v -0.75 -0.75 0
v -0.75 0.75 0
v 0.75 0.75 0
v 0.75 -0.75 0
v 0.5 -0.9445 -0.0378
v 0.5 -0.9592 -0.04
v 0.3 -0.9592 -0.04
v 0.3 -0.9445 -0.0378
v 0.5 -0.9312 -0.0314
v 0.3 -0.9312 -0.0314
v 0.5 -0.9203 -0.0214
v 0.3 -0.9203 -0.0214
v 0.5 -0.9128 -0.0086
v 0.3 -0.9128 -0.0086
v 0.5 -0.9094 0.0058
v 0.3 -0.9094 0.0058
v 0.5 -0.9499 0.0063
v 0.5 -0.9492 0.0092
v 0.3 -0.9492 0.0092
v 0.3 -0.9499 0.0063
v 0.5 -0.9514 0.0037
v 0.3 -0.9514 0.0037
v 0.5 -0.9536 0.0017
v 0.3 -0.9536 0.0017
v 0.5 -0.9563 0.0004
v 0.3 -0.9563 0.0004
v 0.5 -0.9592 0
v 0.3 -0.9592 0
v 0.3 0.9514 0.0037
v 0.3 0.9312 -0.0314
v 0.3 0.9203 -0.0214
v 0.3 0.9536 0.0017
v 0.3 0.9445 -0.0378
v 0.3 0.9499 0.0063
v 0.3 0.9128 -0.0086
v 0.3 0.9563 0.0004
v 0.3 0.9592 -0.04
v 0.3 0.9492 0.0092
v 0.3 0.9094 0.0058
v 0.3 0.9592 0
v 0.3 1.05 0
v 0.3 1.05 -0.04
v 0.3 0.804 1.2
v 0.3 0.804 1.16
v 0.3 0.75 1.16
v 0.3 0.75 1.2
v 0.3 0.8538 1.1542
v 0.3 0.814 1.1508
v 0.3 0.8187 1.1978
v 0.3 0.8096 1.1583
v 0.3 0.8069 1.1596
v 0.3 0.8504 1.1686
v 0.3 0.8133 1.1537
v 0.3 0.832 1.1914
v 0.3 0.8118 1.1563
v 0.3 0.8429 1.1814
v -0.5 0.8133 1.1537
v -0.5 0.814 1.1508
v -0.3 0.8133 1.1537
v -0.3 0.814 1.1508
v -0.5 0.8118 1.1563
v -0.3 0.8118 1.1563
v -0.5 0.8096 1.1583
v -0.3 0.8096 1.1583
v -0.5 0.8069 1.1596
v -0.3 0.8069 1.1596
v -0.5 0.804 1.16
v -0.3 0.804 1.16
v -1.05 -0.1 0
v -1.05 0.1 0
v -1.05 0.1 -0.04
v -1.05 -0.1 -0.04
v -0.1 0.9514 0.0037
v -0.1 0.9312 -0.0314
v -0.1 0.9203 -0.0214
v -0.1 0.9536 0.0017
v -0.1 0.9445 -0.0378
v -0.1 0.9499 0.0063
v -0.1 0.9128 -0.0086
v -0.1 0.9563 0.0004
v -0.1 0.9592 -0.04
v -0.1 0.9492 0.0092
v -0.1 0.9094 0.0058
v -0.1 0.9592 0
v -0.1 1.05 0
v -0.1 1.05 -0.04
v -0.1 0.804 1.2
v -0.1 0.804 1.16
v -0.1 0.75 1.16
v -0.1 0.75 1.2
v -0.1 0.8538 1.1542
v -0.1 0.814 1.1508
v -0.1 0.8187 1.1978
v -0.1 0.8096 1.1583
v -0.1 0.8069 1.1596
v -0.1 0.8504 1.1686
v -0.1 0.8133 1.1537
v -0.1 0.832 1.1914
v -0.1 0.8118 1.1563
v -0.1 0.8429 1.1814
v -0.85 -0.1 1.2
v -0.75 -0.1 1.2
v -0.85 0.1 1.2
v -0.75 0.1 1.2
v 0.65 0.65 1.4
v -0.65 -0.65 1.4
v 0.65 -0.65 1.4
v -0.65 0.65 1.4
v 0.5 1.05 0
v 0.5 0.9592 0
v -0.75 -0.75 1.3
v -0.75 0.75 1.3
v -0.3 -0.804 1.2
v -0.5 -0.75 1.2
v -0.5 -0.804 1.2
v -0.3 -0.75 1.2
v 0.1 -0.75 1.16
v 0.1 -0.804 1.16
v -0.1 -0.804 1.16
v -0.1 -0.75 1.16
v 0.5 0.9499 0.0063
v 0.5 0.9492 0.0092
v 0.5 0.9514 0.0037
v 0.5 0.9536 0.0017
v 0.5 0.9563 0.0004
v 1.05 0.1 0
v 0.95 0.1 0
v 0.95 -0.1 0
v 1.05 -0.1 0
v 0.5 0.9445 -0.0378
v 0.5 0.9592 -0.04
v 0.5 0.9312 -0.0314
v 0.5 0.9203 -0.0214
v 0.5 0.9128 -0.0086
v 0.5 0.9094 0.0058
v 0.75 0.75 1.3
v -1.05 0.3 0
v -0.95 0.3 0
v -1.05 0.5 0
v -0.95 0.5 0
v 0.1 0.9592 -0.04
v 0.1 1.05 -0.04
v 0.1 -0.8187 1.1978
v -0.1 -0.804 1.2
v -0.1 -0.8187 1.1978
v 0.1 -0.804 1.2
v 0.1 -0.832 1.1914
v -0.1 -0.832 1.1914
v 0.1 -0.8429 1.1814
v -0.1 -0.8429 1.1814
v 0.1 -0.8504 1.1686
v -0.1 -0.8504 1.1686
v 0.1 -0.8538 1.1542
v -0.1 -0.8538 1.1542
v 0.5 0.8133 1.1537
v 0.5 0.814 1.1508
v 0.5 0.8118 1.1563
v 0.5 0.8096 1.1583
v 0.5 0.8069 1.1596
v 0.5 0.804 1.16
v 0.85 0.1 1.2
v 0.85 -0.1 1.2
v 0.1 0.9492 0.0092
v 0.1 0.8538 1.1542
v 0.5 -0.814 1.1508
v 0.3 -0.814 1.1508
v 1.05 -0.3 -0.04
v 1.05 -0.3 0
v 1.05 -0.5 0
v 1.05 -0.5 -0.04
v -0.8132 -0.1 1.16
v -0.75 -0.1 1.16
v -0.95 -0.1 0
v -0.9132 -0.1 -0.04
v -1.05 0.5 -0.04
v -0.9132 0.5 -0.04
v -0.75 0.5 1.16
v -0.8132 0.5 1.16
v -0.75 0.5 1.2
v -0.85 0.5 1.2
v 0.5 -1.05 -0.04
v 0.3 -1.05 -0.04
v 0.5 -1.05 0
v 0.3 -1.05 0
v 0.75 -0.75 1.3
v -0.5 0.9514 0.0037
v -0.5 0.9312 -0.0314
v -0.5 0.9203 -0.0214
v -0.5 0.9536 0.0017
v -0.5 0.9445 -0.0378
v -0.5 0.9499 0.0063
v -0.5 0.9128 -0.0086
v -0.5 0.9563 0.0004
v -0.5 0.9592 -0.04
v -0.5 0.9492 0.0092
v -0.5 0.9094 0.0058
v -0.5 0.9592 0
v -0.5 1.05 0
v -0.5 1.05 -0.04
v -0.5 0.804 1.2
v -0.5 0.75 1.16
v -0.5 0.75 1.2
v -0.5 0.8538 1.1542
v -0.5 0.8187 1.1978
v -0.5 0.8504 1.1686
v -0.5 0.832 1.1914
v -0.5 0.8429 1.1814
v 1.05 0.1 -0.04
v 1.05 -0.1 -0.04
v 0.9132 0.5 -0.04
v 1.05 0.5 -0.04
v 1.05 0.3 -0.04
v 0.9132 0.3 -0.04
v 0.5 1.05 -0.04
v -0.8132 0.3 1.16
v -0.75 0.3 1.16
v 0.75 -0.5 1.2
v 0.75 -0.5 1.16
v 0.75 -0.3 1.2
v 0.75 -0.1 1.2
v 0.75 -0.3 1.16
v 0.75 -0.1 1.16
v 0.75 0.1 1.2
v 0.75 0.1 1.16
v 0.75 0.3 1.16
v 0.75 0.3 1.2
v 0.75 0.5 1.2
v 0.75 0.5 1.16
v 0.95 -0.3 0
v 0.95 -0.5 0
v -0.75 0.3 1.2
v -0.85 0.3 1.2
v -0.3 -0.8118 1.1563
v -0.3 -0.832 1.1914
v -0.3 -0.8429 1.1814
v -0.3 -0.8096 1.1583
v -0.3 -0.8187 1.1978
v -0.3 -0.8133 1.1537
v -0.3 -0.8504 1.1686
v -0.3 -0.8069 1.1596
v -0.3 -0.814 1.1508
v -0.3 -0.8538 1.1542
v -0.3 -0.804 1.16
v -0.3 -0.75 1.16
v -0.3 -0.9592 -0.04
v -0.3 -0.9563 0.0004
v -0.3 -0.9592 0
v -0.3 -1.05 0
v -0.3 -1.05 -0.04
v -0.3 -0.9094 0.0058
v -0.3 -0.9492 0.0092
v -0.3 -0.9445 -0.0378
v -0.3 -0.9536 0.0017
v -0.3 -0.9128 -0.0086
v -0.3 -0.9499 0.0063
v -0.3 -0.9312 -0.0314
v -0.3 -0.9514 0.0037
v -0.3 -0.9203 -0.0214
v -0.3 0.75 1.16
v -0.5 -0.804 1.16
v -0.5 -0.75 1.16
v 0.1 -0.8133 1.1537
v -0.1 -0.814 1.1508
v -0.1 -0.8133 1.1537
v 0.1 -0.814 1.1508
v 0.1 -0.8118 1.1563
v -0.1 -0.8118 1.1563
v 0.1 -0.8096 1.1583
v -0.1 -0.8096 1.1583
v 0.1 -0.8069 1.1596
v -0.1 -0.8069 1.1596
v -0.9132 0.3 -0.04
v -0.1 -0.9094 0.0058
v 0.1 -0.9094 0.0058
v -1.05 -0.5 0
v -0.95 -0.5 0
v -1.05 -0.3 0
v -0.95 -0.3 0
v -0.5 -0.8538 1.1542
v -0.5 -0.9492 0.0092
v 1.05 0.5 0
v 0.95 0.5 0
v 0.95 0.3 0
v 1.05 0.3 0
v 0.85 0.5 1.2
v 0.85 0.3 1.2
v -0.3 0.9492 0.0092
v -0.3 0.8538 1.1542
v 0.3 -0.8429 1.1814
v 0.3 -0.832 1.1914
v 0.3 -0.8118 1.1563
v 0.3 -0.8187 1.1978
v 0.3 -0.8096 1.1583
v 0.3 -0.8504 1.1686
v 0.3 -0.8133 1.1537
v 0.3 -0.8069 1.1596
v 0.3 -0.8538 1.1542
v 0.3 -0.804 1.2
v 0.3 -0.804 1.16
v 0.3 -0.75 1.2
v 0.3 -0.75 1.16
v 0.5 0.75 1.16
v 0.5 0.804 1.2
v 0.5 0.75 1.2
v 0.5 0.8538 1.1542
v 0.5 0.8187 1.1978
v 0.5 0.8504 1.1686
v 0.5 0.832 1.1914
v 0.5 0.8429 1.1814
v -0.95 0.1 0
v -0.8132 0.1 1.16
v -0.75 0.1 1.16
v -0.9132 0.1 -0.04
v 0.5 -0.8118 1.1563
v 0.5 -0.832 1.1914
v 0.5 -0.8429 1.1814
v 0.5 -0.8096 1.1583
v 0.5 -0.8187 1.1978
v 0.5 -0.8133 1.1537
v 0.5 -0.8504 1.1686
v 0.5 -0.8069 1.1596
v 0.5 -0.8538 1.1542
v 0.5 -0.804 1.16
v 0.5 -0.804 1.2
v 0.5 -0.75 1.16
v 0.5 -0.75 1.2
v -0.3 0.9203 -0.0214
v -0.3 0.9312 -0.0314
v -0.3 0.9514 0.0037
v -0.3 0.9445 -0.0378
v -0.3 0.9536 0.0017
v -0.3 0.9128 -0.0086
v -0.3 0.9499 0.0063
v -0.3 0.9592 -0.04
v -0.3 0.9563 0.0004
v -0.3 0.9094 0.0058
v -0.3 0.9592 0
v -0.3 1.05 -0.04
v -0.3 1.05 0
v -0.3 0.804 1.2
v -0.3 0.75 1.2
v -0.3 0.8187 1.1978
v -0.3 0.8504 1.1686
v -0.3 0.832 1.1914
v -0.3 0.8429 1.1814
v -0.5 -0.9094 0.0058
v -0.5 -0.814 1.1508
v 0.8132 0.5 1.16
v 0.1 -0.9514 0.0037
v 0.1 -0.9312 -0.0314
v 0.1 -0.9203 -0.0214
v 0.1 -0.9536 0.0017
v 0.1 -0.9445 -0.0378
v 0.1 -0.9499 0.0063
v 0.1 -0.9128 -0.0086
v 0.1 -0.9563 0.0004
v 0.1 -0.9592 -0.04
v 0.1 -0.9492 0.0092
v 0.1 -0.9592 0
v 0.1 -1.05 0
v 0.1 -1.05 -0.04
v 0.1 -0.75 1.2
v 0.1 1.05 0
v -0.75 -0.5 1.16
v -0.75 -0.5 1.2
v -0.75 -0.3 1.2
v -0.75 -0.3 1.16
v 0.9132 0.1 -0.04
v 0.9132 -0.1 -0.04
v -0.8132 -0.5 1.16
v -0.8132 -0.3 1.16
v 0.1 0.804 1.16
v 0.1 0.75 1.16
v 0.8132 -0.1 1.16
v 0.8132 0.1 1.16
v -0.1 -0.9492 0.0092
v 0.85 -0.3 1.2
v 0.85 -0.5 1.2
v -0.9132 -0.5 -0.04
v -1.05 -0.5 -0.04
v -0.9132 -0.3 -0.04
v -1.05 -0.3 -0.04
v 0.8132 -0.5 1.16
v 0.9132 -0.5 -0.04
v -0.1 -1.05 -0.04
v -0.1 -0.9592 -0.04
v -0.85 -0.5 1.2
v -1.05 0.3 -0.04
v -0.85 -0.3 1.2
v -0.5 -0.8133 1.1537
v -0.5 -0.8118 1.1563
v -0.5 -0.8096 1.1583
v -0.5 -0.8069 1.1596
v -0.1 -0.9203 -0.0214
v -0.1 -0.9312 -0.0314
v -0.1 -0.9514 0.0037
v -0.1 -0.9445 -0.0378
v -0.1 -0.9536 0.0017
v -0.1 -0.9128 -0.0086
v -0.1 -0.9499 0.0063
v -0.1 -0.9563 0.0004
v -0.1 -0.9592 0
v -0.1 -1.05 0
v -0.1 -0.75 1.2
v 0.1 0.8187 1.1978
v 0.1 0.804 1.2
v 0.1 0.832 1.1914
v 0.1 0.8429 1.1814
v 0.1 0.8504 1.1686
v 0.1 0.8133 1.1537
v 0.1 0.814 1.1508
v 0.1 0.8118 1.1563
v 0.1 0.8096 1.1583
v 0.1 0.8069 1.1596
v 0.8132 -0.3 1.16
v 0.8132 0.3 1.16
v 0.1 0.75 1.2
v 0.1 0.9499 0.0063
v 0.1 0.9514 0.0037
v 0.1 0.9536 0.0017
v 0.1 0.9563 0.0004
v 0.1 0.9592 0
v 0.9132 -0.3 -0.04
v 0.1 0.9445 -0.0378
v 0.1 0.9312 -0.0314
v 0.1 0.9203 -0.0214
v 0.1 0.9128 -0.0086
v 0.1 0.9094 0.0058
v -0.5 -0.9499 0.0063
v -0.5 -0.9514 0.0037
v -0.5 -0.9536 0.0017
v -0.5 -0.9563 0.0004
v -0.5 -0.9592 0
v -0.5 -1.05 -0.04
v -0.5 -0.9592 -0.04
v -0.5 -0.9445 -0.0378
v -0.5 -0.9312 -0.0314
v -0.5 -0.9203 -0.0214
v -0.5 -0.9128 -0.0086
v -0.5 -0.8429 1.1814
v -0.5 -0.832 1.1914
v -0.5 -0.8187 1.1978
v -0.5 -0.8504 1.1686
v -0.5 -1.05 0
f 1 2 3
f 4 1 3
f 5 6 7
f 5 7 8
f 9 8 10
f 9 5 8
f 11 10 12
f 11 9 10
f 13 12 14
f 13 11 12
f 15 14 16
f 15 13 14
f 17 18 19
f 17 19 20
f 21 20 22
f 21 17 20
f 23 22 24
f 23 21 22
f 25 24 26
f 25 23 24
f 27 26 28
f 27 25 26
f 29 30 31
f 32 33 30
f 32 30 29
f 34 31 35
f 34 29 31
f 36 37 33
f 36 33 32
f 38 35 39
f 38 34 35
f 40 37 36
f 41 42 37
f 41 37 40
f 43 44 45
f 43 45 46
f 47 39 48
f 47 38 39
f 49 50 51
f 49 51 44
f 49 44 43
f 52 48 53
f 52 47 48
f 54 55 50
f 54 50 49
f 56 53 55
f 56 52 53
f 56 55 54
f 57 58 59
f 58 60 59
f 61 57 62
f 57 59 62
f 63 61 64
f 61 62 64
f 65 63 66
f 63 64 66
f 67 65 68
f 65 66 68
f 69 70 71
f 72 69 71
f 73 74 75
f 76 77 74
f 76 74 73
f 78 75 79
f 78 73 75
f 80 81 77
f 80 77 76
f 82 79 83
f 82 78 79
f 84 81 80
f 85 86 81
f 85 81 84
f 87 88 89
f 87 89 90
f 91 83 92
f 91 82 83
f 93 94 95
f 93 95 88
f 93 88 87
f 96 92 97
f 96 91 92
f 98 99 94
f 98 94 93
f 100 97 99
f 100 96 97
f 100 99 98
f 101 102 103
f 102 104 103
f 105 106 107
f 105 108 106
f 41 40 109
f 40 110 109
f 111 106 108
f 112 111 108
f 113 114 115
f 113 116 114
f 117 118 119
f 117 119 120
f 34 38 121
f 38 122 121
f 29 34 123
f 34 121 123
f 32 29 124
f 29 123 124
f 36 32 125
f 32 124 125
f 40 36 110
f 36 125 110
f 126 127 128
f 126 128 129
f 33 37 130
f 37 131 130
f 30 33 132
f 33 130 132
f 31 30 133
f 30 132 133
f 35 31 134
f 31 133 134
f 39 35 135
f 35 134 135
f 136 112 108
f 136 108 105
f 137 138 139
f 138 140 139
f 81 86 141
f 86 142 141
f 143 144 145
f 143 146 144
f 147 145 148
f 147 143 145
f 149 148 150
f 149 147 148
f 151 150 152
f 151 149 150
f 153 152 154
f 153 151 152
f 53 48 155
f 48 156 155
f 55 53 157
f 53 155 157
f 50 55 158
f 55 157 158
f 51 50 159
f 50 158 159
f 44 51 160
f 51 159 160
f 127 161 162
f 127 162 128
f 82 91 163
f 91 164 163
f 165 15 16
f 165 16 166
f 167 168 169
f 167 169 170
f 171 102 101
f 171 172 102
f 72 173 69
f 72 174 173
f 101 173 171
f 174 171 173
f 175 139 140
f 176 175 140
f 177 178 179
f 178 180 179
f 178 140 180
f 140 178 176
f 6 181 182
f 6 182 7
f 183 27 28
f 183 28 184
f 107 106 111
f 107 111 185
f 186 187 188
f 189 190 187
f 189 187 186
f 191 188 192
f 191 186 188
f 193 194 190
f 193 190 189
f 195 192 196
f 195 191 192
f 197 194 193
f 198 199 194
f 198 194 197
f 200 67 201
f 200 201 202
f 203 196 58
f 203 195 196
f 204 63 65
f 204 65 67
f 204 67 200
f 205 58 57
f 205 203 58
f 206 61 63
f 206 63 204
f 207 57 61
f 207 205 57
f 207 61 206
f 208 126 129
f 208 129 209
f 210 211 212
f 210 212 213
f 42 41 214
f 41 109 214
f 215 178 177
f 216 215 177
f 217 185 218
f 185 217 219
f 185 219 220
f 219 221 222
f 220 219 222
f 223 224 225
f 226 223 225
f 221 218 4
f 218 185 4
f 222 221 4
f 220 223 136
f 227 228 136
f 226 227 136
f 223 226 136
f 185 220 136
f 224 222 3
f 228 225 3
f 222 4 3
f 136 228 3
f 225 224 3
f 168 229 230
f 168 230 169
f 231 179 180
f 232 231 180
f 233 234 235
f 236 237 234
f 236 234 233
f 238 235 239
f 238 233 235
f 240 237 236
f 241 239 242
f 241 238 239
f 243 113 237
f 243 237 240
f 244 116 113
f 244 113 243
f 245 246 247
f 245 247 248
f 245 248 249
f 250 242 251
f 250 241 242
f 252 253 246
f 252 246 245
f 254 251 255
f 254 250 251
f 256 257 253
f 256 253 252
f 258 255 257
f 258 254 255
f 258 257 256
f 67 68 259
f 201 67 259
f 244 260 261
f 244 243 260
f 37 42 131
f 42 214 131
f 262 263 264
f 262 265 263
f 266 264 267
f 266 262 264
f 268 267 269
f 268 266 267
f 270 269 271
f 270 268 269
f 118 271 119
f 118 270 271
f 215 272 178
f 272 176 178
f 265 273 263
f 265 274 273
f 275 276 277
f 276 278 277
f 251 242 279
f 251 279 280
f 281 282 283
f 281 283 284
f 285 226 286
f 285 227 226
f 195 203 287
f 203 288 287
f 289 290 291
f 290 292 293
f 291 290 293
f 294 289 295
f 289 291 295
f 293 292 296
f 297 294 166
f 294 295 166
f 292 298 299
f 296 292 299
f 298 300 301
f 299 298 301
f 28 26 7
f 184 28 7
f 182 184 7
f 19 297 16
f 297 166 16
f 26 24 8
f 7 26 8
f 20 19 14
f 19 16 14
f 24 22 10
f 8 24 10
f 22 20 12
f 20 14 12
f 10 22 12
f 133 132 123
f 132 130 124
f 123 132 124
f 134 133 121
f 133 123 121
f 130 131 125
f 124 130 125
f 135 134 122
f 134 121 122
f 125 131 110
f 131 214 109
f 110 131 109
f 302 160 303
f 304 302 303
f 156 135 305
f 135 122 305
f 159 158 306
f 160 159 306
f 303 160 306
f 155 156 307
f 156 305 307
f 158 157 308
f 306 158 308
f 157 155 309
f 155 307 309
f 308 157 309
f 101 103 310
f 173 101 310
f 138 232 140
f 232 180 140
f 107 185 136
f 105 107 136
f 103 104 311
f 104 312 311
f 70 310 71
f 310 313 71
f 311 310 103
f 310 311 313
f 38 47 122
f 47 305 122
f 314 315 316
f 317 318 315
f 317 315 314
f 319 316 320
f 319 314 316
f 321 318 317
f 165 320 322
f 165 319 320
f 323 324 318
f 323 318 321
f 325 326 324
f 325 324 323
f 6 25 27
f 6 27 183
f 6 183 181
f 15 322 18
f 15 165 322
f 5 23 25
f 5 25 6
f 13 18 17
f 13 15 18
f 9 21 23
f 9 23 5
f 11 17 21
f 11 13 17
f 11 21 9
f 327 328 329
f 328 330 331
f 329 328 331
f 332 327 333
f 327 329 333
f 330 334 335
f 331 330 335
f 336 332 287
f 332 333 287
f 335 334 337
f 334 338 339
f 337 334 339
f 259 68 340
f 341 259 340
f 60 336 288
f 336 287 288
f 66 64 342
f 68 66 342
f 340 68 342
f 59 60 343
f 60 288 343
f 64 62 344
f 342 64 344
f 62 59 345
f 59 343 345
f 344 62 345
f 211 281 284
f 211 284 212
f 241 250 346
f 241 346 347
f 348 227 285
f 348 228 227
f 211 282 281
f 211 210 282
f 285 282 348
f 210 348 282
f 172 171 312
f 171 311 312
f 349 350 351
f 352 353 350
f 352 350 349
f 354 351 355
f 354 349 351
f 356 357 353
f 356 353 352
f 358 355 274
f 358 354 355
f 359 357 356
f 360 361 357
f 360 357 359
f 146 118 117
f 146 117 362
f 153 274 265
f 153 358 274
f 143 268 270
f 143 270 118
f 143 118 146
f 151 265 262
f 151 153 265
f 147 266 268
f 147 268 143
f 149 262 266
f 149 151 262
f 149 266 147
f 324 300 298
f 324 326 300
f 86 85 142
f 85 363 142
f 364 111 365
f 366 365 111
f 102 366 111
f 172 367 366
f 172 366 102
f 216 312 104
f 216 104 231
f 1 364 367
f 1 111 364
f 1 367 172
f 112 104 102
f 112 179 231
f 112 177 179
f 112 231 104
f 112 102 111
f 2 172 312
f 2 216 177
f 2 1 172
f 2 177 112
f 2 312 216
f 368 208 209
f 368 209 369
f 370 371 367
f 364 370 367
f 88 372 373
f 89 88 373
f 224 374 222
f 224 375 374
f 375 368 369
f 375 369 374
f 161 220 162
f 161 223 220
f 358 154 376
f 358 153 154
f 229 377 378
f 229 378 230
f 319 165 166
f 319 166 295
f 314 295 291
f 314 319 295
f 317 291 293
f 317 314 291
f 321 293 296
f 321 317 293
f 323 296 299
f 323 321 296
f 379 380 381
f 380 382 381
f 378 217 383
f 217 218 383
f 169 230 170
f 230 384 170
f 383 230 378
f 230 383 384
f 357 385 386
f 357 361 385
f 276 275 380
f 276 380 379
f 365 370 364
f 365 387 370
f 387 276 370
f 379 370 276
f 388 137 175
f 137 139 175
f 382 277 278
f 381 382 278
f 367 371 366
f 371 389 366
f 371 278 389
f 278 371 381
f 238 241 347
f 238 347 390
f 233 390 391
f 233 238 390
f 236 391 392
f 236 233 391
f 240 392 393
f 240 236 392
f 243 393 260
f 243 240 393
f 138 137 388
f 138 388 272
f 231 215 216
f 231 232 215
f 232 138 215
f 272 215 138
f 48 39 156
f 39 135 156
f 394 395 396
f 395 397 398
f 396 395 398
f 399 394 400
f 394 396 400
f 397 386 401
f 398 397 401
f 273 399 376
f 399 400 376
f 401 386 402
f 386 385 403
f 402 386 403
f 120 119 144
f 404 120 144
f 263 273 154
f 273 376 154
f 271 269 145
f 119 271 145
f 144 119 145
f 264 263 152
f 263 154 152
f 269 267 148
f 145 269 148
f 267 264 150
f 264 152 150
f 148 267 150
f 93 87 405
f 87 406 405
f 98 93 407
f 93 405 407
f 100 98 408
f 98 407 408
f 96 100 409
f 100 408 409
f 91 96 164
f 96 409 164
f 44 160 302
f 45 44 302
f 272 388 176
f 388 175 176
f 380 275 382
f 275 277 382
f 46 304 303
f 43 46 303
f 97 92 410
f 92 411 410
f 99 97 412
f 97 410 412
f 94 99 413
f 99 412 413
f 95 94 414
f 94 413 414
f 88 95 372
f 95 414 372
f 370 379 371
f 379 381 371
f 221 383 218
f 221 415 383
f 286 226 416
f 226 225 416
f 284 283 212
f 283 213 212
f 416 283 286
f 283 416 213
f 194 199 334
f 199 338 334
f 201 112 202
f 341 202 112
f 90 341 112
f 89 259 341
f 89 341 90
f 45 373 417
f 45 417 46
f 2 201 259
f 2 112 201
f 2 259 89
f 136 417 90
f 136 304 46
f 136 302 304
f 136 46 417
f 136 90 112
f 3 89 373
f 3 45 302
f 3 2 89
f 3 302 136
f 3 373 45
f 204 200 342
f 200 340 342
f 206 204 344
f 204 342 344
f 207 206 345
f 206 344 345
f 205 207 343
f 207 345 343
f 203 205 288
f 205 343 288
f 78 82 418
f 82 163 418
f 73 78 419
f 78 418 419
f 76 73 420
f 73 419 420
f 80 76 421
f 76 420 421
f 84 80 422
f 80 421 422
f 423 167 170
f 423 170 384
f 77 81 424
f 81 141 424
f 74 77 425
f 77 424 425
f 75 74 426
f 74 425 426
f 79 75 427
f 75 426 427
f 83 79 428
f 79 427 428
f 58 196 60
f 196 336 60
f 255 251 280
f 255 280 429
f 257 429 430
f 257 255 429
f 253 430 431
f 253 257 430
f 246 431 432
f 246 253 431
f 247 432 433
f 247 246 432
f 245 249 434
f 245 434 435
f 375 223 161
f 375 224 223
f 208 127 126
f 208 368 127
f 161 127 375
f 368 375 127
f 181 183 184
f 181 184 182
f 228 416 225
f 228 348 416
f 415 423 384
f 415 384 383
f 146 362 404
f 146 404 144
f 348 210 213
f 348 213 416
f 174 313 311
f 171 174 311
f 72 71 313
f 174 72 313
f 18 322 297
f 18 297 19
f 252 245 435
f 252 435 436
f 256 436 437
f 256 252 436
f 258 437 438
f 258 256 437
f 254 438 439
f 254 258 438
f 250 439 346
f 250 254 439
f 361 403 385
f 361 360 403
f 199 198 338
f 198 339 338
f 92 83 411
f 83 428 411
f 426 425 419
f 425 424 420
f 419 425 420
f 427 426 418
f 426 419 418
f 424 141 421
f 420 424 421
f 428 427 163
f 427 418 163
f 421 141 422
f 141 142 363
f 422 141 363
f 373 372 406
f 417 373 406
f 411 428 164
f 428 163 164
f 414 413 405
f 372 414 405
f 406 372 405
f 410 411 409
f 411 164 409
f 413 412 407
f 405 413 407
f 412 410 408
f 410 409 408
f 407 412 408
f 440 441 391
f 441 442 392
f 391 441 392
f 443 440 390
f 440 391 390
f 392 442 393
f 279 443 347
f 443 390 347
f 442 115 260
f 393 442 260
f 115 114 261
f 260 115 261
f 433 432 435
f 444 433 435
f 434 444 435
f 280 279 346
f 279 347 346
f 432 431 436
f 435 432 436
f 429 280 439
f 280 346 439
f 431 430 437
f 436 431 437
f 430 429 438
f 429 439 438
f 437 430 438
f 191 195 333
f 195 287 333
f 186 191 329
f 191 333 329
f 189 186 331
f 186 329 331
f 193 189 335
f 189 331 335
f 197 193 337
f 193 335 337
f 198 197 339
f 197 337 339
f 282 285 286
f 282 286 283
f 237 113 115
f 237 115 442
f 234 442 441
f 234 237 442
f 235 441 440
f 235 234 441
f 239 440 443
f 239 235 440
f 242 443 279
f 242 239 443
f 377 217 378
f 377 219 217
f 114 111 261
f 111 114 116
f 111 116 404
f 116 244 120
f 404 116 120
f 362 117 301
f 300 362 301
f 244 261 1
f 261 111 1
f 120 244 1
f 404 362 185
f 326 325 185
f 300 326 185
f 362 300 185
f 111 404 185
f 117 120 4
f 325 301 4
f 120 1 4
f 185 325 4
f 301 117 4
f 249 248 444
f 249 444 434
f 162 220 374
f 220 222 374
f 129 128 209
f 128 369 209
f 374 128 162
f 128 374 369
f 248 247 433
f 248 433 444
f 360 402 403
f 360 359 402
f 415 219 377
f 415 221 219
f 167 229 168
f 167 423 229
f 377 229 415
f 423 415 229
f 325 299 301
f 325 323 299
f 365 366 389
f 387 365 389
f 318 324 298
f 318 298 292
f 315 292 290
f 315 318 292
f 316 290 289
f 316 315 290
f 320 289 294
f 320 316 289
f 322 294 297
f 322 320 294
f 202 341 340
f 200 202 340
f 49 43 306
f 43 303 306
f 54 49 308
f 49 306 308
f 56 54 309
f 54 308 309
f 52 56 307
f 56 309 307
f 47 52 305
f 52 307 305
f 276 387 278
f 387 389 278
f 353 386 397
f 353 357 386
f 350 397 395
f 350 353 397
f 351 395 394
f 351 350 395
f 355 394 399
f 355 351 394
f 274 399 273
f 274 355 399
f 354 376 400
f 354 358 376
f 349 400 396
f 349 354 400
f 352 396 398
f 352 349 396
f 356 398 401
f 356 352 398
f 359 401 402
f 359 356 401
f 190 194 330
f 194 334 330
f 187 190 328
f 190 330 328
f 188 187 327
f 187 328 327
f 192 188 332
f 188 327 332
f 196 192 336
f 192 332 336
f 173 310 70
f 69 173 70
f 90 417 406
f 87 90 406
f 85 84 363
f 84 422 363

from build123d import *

# Parameters (mm, degrees)
COMPONENT_OUTLINE_W  = 1.5
COMPONENT_OUTLINE_H  = 1.5
EXTRUDE1_DEPTH       = 1.4
EXTRUDE_THIN1_DEPTH  = 0.1
LPATTERN1_COUNT      = 2
LPATTERN1_PITCH      = 0.4
LPATTERN1_COL_COUNT  = 2
LPATTERN1_COL_PITCH  = 0.4
MIRROR1_COPY_1_DEPTH = 0.1
MIRROR1_COPY_2_DEPTH = 0.1
EXTRUDE_THIN2_DEPTH  = 0.1
LPATTERN2_COUNT      = 2
LPATTERN2_PITCH      = 0.4
LPATTERN2_COL_COUNT  = 2
LPATTERN2_COL_PITCH  = 0.4
MIRROR2_COPY_1_DEPTH = 0.1
MIRROR2_COPY_2_DEPTH = 0.1
CHAMFER1_SIZE        = 0.1


with BuildPart() as part:
    # COMPONENT_OUTLINE → Extrude1 (new body)
    with BuildSketch(Plane.XY):
        Rectangle(COMPONENT_OUTLINE_W, COMPONENT_OUTLINE_H)
    extrude(amount=EXTRUDE1_DEPTH)

    # Sketch1 → Extrude-Thin1 (add, symmetric)
    with BuildSketch(Plane(origin=(0, 0, 0), x_dir=(0, 0, -1), z_dir=(1, 0, 0))):
        with BuildLine():
            Line((-1.2, 0.75), (-1.2, 0.803993356))
            ThreePointArc((-1.2, 0.803993356), (-1.186794114, 0.83784883), (-1.154152274, 0.853820644))
            Line((-1.154152274, 0.853820644), (-0.009169545, 0.949235871))
            ThreePointArc((-0.009169545, 0.949235871), (-0.002641177, 0.952430234), (0, 0.959201329))
            Line((0, 0.959201329), (0, 1.05))
            Line((0, 1.05), (0.04, 1.05))
            Line((0.04, 1.05), (0.04, 0.959201329))
            ThreePointArc((0.04, 0.959201329), (0.026794114, 0.925345854), (-0.005847726, 0.909374041))
            Line((-0.005847726, 0.909374041), (-1.150830455, 0.813958814))
            ThreePointArc((-1.150830455, 0.813958814), (-1.157358823, 0.810764451), (-1.16, 0.803993356))
            Line((-1.16, 0.803993356), (-1.16, 0.75))
            Line((-1.16, 0.75), (-1.2, 0.75))
        make_face()
    extrude_thin1 = extrude(amount=EXTRUDE_THIN1_DEPTH, both=True)

    # LPattern1: Extrude-Thin1 ×2
    with Locations(*[(-i * LPATTERN1_PITCH, 0, 0) for i in range(1, LPATTERN1_COUNT)]):
        add(extrude_thin1)

    # LPattern1 col: Extrude-Thin1 ×2
    with Locations(*[(i * LPATTERN1_COL_PITCH, 0, 0) for i in range(1, LPATTERN1_COL_COUNT)]):
        add(extrude_thin1)

    # Mirror1: Extrude-Thin1 across plane
    add(extrude_thin1.mirror(Plane.ZX))

    # Mirror1 copy 1 sketch → Mirror1 copy 1 (add, symmetric)
    with BuildSketch(Plane(origin=(-0.4, 0, 0), x_dir=(0, 0, -1), z_dir=(1, 0, 0))):
        with BuildLine():
            Line((-1.2, -0.75), (-1.2, -0.803993356))
            ThreePointArc((-1.2, -0.803993356), (-1.186794114, -0.83784883), (-1.154152274, -0.853820644))
            Line((-1.154152274, -0.853820644), (-0.009169545, -0.949235871))
            ThreePointArc((-0.009169545, -0.949235871), (-0.002641177, -0.952430234), (0, -0.959201329))
            Line((0, -0.959201329), (0, -1.05))
            Line((0, -1.05), (0.04, -1.05))
            Line((0.04, -1.05), (0.04, -0.959201329))
            ThreePointArc((0.04, -0.959201329), (0.026794114, -0.925345854), (-0.005847726, -0.909374041))
            Line((-0.005847726, -0.909374041), (-1.150830455, -0.813958814))
            ThreePointArc((-1.150830455, -0.813958814), (-1.157358823, -0.810764451), (-1.16, -0.803993356))
            Line((-1.16, -0.803993356), (-1.16, -0.75))
            Line((-1.16, -0.75), (-1.2, -0.75))
        make_face()
    extrude(amount=MIRROR1_COPY_1_DEPTH, both=True)

    # Mirror1 copy 2 sketch → Mirror1 copy 2 (add, symmetric)
    with BuildSketch(Plane(origin=(0.4, 0, 0), x_dir=(0, 0, -1), z_dir=(1, 0, 0))):
        with BuildLine():
            Line((-1.2, -0.75), (-1.2, -0.803993356))
            ThreePointArc((-1.2, -0.803993356), (-1.186794114, -0.83784883), (-1.154152274, -0.853820644))
            Line((-1.154152274, -0.853820644), (-0.009169545, -0.949235871))
            ThreePointArc((-0.009169545, -0.949235871), (-0.002641177, -0.952430234), (0, -0.959201329))
            Line((0, -0.959201329), (0, -1.05))
            Line((0, -1.05), (0.04, -1.05))
            Line((0.04, -1.05), (0.04, -0.959201329))
            ThreePointArc((0.04, -0.959201329), (0.026794114, -0.925345854), (-0.005847726, -0.909374041))
            Line((-0.005847726, -0.909374041), (-1.150830455, -0.813958814))
            ThreePointArc((-1.150830455, -0.813958814), (-1.157358823, -0.810764451), (-1.16, -0.803993356))
            Line((-1.16, -0.803993356), (-1.16, -0.75))
            Line((-1.16, -0.75), (-1.2, -0.75))
        make_face()
    extrude(amount=MIRROR1_COPY_2_DEPTH, both=True)

    # Sketch2 → Extrude-Thin2 (add, symmetric)
    with BuildSketch(Plane(origin=(0, 0, 0), x_dir=(1, 0, 0), z_dir=(0, 1, 0))):
        Polygon((0.75, -1.2), (0.85, -1.2), (0.95, 0), (1.05, 0), (1.05, 0.04), (0.913194685, 0.04), (0.813194685, -1.16), (0.75, -1.16), align=None)
    extrude_thin2 = extrude(amount=EXTRUDE_THIN2_DEPTH, both=True)

    # LPattern2: Extrude-Thin2 ×2
    with Locations(*[(0, i * LPATTERN2_PITCH, 0) for i in range(1, LPATTERN2_COUNT)]):
        add(extrude_thin2)

    # LPattern2 col: Extrude-Thin2 ×2
    with Locations(*[(0, -i * LPATTERN2_COL_PITCH, 0) for i in range(1, LPATTERN2_COL_COUNT)]):
        add(extrude_thin2)

    # Mirror2: Extrude-Thin2 across plane
    add(extrude_thin2.mirror(Plane(origin=(0, 0, 0), x_dir=(0, 0, 1), z_dir=(1, 0, 0))))

    # Mirror2 copy 1 sketch → Mirror2 copy 1 (add, symmetric)
    with BuildSketch(Plane(origin=(0, 0.4, 0), x_dir=(-1, 0, 0), z_dir=(0, 1, 0))):
        Polygon((0.75, 1.2), (0.85, 1.2), (0.95, 0), (1.05, 0), (1.05, -0.04), (0.913194685, -0.04), (0.813194685, 1.16), (0.75, 1.16), align=None)
    extrude(amount=MIRROR2_COPY_1_DEPTH, both=True)

    # Mirror2 copy 2 sketch → Mirror2 copy 2 (add, symmetric)
    with BuildSketch(Plane(origin=(0, -0.4, 0), x_dir=(-1, 0, 0), z_dir=(0, 1, 0))):
        Polygon((0.75, 1.2), (0.85, 1.2), (0.95, 0), (1.05, 0), (1.05, -0.04), (0.913194685, -0.04), (0.813194685, 1.16), (0.75, 1.16), align=None)
    extrude(amount=MIRROR2_COPY_2_DEPTH, both=True)

    # Chamfer1
    chamfer1_edges = [part.edges().sort_by_distance(p)[0] for p in [
        (0, -0.75, 1.4),
        (0.75, 0, 1.4),
        (0, 0.75, 1.4),
        (-0.75, 0, 1.4),
    ]]
    chamfer(chamfer1_edges, length=CHAMFER1_SIZE)


solid = part.part
